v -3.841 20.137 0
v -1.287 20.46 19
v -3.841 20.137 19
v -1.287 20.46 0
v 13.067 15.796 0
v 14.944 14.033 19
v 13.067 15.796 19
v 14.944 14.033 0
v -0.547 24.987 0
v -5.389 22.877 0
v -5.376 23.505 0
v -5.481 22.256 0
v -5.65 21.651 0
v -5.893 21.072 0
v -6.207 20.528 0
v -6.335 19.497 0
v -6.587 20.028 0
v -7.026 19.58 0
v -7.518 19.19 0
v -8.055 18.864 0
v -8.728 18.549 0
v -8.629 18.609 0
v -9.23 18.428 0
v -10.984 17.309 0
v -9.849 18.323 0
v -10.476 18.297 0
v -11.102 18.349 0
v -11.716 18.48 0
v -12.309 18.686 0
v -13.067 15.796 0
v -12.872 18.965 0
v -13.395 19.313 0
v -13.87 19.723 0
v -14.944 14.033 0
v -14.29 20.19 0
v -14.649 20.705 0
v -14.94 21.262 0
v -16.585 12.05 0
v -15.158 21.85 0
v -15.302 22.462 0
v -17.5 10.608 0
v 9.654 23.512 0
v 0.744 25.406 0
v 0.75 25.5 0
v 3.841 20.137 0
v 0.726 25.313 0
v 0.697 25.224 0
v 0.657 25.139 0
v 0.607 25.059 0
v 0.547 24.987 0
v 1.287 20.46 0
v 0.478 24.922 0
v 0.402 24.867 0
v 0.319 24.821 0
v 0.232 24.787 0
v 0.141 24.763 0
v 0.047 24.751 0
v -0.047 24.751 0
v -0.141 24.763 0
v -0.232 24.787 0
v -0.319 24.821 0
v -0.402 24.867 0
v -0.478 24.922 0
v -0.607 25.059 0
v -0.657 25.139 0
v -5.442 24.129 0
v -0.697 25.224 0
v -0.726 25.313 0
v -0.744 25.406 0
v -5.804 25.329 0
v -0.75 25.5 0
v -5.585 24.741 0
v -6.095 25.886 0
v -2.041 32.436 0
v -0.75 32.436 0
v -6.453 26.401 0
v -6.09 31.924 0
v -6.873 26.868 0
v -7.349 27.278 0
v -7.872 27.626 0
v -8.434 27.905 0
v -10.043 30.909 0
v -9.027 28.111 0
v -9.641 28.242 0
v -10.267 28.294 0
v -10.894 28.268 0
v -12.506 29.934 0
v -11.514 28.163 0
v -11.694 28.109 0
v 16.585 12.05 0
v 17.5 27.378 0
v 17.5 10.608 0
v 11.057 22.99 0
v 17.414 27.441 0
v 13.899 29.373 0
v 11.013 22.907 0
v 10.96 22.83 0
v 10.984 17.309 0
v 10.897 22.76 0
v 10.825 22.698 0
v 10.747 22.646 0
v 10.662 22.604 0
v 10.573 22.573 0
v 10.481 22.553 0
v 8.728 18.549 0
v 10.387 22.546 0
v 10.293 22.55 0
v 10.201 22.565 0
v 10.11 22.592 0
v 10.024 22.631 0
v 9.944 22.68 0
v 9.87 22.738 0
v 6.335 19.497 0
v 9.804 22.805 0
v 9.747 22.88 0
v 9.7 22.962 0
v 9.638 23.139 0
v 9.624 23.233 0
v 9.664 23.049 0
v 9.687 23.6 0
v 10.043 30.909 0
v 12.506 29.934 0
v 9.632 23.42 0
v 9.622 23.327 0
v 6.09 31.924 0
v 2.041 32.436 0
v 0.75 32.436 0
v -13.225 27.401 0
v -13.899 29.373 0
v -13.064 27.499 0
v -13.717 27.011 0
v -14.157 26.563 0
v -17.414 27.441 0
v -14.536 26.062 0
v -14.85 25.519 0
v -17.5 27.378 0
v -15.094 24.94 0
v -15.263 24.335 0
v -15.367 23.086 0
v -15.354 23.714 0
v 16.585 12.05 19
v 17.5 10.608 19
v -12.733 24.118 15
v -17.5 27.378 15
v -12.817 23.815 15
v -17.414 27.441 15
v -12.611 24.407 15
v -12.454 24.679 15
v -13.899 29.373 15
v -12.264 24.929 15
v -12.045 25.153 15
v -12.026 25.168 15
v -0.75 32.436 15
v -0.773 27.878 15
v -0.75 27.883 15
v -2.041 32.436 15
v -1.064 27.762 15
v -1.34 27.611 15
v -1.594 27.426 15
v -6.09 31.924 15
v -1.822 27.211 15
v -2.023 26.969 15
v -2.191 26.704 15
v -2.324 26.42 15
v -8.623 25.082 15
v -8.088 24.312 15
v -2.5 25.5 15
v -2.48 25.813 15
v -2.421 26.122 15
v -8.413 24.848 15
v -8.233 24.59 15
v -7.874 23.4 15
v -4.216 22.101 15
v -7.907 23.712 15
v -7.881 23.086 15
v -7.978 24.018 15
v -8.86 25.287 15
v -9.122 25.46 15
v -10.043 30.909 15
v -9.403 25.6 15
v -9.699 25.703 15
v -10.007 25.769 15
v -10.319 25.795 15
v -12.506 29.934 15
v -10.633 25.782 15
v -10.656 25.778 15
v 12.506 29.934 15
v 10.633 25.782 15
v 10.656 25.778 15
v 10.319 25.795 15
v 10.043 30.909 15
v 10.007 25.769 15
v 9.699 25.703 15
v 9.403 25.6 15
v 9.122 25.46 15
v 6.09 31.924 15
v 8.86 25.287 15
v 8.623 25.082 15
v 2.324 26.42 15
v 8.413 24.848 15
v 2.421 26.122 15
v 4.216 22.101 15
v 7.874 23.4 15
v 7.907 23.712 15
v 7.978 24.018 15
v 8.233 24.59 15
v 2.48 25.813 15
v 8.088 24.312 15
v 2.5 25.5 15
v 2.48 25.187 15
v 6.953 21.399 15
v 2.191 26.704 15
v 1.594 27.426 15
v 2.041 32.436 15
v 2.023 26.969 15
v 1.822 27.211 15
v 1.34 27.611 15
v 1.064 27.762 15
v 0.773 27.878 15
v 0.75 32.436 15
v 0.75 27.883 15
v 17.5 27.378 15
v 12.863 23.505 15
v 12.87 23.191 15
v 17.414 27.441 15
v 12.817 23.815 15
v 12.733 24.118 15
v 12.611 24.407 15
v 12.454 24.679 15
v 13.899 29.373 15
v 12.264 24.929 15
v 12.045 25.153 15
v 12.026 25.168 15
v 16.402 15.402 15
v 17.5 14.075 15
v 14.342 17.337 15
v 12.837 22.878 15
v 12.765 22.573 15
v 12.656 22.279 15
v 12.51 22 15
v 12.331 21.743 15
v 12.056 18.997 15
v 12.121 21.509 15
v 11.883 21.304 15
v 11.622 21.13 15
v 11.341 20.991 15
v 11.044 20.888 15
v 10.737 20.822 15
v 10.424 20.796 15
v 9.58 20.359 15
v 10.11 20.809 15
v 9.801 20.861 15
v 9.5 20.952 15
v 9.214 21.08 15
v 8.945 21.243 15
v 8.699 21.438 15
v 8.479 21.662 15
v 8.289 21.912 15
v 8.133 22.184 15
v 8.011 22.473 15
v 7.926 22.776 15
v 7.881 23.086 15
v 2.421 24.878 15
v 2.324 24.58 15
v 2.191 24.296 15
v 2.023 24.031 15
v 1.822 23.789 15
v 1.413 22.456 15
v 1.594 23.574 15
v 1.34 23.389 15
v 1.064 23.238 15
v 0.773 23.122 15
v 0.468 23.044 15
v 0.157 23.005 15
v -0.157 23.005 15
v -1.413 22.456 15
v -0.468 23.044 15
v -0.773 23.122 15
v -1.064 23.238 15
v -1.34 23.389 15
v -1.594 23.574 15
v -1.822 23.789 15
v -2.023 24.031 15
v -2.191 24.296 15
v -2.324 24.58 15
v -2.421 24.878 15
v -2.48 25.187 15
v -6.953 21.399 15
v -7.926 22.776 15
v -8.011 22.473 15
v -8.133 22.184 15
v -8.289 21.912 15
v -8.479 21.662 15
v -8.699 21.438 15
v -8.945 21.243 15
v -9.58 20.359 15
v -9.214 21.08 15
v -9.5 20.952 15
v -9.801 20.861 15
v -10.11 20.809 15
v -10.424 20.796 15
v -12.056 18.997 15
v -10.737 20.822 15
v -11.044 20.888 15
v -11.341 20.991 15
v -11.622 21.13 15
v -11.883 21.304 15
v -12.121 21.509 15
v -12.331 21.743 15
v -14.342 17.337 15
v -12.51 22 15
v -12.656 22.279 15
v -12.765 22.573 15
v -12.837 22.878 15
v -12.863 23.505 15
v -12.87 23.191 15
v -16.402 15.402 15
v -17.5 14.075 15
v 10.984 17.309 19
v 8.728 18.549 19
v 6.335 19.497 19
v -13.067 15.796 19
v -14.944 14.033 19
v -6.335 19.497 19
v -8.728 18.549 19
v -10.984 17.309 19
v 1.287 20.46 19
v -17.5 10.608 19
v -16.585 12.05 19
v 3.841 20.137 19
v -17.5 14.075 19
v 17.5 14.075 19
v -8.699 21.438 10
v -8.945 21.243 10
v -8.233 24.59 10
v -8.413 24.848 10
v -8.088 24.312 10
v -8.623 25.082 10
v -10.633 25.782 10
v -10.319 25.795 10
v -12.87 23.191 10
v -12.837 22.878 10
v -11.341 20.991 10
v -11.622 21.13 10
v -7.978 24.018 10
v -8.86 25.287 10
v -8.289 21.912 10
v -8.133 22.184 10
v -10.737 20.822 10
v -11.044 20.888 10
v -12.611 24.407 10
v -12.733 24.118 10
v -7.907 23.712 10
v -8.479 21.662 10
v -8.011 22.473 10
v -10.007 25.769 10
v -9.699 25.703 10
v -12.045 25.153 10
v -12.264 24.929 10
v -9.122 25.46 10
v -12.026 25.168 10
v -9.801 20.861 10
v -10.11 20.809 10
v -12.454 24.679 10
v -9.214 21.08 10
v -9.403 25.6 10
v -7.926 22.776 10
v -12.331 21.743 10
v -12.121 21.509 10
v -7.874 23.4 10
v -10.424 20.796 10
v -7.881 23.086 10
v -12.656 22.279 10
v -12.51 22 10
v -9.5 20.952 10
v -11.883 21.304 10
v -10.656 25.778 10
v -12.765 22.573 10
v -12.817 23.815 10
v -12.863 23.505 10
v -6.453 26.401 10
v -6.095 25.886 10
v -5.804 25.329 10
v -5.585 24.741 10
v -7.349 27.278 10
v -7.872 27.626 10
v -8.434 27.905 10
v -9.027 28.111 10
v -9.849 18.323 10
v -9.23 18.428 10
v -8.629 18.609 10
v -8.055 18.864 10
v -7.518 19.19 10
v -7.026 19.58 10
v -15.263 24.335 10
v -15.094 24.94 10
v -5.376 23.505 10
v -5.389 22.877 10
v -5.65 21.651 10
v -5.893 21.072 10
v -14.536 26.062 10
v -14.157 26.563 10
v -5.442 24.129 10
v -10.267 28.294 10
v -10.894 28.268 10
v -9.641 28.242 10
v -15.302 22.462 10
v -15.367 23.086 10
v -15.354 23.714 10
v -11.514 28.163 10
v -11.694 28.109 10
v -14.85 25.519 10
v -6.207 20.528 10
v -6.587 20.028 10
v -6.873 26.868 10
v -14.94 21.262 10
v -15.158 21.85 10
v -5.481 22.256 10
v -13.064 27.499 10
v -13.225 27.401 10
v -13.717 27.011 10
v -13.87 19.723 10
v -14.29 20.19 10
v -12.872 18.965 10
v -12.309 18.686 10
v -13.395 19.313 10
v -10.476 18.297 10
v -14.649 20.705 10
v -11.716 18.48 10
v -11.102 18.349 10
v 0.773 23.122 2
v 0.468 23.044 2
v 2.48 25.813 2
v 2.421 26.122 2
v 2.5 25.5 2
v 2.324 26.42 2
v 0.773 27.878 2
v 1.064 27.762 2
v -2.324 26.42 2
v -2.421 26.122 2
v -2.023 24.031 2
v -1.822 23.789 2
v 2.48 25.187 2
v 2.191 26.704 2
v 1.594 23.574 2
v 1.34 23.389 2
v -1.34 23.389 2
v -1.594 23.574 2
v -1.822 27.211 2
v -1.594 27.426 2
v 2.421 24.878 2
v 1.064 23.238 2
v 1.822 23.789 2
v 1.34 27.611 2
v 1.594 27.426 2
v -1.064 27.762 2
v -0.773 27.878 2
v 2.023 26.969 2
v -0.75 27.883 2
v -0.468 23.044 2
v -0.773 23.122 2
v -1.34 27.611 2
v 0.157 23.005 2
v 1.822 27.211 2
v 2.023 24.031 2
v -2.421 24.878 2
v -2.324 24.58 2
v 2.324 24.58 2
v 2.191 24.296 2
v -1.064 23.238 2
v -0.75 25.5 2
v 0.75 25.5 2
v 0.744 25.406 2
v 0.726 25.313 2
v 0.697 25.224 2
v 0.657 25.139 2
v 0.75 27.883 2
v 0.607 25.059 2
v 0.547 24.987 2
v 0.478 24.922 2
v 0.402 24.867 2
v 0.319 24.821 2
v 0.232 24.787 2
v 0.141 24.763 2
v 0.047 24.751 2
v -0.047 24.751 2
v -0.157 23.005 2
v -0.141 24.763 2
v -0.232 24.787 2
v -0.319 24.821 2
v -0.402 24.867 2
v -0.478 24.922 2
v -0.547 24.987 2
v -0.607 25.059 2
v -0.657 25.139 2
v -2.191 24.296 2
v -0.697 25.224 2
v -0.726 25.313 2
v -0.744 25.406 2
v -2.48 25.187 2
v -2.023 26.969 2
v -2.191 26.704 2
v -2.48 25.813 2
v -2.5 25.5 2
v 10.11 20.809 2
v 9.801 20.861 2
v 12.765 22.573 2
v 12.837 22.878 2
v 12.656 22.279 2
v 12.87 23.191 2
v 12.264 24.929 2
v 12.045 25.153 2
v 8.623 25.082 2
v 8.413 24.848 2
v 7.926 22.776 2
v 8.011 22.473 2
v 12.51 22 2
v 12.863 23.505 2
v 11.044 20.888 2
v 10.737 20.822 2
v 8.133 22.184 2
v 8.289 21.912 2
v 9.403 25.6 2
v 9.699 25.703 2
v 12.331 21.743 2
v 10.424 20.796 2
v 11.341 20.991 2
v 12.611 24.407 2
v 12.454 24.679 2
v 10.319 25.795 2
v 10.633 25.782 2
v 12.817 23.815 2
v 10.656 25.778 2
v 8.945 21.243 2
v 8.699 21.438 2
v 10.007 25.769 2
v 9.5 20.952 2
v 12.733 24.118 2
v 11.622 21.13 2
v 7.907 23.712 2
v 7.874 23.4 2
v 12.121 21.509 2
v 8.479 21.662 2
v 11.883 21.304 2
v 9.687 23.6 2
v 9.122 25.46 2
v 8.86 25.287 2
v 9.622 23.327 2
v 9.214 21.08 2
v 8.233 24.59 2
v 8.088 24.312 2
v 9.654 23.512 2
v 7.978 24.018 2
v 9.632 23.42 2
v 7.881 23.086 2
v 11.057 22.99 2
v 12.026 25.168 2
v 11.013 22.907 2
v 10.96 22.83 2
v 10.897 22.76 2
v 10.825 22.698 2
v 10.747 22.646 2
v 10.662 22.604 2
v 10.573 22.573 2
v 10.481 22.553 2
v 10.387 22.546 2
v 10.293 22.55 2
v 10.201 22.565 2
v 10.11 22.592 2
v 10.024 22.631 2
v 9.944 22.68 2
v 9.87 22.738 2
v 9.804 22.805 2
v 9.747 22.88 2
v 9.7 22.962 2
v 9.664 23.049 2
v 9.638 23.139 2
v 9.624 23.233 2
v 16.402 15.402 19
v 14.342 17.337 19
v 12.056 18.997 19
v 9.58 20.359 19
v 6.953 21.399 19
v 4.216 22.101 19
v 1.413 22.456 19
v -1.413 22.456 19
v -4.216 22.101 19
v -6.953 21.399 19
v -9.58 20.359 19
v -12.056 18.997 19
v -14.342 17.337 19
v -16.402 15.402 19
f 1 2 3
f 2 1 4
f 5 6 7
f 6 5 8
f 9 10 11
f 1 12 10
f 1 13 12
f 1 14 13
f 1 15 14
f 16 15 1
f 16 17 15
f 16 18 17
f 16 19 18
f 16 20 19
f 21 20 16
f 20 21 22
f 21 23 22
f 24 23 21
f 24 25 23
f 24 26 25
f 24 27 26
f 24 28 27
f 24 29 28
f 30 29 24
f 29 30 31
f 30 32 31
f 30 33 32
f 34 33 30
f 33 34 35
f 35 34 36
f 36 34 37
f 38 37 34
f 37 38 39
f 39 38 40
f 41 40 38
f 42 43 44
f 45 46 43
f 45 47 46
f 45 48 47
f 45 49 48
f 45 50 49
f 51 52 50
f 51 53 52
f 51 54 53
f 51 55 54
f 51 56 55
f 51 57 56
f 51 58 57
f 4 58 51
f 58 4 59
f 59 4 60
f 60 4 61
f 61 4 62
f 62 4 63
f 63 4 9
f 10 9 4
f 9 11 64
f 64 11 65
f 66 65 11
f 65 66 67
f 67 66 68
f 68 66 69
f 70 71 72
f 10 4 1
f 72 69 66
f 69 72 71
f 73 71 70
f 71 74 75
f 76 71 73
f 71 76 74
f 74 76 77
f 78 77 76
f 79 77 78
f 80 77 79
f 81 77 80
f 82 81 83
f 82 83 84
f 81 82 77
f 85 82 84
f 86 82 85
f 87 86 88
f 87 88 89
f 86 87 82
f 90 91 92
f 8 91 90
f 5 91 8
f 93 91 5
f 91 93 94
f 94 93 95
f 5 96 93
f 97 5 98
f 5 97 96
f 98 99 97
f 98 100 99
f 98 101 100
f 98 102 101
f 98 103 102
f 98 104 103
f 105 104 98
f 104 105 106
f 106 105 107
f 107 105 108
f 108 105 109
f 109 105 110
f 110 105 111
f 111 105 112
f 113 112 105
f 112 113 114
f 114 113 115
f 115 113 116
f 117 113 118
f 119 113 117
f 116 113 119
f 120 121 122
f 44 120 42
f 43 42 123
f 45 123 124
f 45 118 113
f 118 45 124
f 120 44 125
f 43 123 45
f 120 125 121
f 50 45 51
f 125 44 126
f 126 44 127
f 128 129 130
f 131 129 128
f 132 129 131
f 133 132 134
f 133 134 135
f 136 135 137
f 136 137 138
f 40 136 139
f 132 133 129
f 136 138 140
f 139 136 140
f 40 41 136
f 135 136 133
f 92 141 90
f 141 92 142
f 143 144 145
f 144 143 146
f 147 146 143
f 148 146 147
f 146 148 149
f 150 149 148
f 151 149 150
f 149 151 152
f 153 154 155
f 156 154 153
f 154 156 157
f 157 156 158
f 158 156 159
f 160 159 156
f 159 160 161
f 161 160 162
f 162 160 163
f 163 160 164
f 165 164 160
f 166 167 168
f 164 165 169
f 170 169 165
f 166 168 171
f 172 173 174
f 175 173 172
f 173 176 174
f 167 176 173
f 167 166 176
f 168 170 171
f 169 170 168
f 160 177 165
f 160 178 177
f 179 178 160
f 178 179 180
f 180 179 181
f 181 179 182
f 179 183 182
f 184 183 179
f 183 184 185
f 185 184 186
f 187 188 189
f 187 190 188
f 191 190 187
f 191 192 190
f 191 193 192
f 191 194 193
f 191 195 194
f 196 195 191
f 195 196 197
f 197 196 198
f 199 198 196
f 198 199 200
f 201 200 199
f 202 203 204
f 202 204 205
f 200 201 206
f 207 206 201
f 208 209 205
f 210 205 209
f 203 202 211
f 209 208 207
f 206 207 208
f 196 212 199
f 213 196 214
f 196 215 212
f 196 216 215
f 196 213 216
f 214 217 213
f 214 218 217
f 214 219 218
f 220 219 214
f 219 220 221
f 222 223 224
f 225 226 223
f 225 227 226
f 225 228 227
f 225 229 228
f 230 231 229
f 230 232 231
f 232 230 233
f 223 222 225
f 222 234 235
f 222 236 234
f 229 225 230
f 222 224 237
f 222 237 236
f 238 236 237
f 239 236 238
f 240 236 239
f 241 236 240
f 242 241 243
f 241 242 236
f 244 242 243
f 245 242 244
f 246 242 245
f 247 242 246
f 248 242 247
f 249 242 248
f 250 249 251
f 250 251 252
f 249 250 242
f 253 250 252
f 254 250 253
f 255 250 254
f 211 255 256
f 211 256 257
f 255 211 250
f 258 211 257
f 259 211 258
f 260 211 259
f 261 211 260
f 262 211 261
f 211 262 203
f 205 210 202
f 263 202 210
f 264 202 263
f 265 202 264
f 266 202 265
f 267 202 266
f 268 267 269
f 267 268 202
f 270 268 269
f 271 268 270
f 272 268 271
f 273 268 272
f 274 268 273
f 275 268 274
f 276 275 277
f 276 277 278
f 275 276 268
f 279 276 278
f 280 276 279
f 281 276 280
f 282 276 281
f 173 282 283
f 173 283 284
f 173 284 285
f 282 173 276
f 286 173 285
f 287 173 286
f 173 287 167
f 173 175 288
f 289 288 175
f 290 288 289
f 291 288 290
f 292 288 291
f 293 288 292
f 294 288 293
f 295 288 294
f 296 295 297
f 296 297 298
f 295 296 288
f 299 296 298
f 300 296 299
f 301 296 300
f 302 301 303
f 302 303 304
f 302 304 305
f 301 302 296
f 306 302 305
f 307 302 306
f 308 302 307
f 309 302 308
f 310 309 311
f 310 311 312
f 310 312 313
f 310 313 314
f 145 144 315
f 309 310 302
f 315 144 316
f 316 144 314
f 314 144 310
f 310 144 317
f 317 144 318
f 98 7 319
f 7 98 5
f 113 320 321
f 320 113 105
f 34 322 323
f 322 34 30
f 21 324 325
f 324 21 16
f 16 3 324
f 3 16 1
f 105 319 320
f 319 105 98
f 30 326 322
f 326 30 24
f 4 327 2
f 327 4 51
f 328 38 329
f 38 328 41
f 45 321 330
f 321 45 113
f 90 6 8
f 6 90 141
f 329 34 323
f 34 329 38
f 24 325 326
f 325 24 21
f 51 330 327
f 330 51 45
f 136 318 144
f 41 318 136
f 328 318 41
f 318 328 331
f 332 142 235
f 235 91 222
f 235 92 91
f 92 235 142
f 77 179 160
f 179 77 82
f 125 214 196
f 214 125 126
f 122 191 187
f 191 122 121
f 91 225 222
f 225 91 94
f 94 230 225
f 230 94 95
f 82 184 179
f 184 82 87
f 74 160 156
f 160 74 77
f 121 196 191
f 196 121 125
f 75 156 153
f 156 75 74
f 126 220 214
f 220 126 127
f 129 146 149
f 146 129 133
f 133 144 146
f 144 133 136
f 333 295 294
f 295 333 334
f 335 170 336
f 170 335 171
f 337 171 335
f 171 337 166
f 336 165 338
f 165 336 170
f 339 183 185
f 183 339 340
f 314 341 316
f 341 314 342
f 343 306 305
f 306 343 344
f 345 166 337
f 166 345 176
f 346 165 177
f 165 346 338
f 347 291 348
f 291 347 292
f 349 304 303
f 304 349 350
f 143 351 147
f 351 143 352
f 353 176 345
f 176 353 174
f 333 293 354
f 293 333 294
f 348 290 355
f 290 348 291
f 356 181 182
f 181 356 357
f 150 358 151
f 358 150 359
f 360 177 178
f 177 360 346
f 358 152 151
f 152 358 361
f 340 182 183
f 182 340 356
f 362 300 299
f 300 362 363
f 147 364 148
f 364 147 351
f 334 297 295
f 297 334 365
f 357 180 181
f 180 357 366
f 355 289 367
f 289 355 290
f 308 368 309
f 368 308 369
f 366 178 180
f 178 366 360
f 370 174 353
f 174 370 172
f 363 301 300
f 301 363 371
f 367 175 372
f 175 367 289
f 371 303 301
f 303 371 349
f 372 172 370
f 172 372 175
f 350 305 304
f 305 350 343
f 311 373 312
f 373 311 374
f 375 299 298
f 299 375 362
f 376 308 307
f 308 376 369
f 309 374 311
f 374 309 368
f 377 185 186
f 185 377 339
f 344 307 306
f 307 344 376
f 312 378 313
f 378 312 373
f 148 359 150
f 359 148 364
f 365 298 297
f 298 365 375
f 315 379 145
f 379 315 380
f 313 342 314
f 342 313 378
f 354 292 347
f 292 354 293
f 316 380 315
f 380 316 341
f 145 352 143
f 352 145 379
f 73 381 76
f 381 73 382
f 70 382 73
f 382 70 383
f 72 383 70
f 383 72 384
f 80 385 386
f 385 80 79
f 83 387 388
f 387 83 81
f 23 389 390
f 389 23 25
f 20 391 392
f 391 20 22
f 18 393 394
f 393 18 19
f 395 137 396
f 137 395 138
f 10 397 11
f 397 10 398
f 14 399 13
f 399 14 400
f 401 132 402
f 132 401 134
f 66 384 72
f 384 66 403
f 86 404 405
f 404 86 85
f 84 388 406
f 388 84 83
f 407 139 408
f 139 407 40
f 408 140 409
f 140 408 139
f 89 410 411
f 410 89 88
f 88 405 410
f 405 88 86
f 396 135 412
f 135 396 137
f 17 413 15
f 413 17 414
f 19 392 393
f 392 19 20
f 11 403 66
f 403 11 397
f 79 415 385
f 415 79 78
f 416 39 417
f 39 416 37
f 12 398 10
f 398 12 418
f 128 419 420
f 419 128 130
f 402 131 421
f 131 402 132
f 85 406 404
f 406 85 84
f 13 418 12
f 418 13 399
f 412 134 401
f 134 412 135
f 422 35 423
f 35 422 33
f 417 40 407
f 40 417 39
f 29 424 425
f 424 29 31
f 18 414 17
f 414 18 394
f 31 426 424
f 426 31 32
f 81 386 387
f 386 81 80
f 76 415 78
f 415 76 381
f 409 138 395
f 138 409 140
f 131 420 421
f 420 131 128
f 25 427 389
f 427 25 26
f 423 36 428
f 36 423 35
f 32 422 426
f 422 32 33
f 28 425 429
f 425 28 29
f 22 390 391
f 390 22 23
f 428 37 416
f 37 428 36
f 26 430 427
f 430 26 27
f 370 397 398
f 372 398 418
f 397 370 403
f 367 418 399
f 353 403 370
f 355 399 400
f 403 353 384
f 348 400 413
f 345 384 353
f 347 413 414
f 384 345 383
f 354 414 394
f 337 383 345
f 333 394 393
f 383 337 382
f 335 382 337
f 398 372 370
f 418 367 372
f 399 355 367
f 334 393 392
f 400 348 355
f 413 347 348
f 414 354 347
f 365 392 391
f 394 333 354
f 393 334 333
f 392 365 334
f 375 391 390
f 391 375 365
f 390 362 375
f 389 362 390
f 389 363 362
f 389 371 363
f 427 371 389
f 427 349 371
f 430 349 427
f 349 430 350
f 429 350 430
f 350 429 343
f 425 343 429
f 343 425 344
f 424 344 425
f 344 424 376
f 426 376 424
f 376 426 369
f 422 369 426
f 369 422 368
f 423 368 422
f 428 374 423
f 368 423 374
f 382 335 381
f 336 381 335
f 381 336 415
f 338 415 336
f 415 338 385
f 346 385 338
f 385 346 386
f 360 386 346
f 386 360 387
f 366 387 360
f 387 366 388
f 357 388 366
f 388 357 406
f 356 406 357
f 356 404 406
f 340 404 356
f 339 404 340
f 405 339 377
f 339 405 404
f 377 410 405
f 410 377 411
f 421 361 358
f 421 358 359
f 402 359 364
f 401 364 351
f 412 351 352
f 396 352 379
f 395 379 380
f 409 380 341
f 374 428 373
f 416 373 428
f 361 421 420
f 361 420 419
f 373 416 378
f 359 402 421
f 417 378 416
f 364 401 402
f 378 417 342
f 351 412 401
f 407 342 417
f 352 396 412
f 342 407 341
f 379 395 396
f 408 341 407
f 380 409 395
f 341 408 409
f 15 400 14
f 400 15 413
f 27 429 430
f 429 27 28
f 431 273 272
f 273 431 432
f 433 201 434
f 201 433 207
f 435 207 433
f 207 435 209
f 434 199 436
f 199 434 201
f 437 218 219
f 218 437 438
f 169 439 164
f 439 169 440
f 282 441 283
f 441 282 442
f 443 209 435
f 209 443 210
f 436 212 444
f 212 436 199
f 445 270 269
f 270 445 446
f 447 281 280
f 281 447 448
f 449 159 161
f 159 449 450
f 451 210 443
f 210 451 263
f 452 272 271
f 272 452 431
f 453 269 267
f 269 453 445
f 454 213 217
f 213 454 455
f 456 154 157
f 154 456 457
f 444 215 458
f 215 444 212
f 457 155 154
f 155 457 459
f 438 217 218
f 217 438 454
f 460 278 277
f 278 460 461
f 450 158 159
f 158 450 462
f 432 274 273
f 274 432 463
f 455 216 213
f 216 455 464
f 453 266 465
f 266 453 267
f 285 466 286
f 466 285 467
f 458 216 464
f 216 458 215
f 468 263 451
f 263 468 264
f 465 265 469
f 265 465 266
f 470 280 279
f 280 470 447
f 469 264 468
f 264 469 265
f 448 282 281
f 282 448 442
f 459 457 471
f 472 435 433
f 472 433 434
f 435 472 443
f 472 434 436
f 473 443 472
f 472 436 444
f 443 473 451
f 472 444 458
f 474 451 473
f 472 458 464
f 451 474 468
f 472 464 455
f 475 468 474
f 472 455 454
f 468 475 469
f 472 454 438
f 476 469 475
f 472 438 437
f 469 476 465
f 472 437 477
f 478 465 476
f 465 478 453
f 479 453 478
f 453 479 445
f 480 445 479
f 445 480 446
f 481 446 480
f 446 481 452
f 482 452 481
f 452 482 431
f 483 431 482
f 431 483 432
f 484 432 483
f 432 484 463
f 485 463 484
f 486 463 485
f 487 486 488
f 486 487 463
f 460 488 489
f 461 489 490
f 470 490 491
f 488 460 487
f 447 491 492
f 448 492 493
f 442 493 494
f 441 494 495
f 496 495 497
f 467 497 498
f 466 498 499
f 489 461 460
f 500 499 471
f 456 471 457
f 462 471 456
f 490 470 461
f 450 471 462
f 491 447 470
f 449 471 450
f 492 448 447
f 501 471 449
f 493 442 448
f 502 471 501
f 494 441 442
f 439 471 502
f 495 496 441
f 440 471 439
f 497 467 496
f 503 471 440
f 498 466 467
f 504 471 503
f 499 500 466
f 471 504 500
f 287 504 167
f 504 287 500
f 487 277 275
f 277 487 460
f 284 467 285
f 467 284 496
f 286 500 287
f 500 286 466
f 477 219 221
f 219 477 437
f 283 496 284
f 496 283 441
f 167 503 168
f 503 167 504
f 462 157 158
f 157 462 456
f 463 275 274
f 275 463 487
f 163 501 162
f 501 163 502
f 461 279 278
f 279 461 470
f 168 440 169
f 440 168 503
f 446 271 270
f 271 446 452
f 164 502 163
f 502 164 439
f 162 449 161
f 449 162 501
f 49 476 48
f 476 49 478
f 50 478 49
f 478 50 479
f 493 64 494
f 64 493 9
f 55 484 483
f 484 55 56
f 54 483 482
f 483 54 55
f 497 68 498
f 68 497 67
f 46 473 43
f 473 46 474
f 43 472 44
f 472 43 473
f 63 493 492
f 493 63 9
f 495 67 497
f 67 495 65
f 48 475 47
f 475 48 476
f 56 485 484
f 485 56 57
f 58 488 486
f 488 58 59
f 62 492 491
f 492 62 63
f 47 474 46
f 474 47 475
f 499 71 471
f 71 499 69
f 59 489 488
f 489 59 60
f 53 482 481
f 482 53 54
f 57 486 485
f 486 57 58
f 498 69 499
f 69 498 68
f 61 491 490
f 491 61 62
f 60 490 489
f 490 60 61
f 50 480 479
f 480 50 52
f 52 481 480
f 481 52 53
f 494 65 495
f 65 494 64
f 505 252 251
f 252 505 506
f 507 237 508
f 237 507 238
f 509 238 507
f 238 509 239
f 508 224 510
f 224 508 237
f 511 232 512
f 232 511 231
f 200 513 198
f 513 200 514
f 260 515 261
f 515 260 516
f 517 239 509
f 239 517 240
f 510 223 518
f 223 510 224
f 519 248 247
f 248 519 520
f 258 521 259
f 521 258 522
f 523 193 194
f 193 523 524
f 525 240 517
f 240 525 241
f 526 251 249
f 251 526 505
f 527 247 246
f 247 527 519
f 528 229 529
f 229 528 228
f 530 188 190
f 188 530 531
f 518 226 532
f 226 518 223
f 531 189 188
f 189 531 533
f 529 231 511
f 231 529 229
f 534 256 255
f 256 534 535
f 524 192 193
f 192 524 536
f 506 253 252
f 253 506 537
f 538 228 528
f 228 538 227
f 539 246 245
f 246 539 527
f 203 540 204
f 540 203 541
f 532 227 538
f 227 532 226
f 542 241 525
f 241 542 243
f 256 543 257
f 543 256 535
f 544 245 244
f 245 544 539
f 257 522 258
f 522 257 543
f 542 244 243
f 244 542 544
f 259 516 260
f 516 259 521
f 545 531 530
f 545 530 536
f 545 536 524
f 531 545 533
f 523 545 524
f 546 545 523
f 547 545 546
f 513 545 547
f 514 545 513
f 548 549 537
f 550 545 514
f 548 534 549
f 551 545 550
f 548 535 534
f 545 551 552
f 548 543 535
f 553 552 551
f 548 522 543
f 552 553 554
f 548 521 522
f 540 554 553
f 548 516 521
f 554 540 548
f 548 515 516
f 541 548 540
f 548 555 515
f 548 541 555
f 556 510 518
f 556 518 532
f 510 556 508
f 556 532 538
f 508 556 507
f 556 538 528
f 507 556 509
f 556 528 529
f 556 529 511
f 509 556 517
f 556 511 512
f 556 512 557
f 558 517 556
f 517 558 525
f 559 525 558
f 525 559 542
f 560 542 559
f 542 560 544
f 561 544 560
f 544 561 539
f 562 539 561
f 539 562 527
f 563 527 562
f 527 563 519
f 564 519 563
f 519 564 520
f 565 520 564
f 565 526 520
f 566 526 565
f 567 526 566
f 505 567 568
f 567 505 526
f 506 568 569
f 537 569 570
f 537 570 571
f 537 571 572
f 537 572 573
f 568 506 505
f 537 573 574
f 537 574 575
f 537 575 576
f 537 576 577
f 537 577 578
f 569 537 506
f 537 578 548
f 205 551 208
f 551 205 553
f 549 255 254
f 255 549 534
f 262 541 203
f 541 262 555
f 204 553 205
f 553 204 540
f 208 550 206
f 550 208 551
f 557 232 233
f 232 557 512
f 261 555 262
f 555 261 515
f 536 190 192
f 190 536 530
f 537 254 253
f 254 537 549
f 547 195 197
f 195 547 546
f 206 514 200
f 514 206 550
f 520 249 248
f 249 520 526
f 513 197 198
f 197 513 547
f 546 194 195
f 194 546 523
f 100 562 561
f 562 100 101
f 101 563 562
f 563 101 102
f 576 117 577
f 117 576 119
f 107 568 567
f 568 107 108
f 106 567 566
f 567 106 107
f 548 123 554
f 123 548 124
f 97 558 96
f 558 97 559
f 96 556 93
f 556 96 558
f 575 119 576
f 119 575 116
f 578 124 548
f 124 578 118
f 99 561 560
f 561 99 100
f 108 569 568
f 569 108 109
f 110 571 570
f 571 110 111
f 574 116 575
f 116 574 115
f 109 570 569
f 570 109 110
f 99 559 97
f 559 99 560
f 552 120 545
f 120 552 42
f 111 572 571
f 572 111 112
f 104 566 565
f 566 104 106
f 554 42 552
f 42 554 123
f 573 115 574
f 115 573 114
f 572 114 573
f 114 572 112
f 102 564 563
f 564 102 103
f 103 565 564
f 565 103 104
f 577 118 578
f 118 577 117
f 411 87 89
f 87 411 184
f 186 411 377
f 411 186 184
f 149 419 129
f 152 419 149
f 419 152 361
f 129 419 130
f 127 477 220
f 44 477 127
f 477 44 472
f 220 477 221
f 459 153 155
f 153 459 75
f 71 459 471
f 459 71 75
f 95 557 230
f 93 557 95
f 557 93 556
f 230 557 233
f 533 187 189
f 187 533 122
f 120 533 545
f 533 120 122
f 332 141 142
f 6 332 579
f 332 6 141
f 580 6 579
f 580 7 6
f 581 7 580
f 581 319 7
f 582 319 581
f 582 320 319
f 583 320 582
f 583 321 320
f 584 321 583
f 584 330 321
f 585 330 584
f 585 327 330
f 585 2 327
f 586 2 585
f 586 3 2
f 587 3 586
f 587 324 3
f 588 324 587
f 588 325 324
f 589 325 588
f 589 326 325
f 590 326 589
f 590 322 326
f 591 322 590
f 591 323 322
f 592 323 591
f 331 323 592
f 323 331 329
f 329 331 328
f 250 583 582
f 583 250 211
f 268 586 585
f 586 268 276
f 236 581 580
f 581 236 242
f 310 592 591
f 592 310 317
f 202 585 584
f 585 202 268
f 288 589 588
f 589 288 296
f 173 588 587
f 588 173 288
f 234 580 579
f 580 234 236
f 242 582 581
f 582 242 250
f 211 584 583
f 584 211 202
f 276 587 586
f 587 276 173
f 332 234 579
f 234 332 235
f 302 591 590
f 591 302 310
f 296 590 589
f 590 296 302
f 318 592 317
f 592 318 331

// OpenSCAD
//tube diameters
D1=41; // original


//small hole diameters
d1=5; // hose
d2=6; 
d3=10; //existing clamp
$fn=50;


module shape_1(d_inner, d_outer, z){
    
    //D2 = D1 + 2* d3 + 4; //outer tube (for topmost bound)
    //Z = 15;
    SIDE_OFFS = 3;
    
    difference() {
        //color("red")
        cylinder(d=d_outer, h=z);

        union() {
            //tube diameter
            color("blue")
            cylinder(d=d_inner, h=z);
            
            //bottom bound 
            translate([-(d_outer/2), -(d_outer/2),0])
            cube([d_outer, d_outer/2, z]);

            //left bound
            translate([-(d_inner/2)-20 + SIDE_OFFS,0,0])
                cube([20, d_outer, z]);

            //right bound
            translate([d_inner/2 - SIDE_OFFS,0,0])
                cube([20, d_outer, z]);
            
        }
    }
}

module cutout(z){
    zz = 10; //existing hole
    CUTOUT = 1.5;
    
    //left
    rotate([0,0,24])
    translate([0,(D1+d3)/2,0]) {        
        translate([0,0,2]) {
            cylinder(d=d1, h=z);                        
        }
        cylinder(d=d3, h=zz);
        cylinder(d=CUTOUT, h=z);
    }
    
    rotate([0,0,24])
    translate([-CUTOUT/2,(D1+d3)/2,0]) 
    cube([CUTOUT,d3,z]);

    
    //middle
    translate([0,(D1+d3)/2,0]){
        translate([0,0,2]) {
            cylinder(d=d1, h=z);
        }
        cylinder(d=CUTOUT, h=z);
    }
        
    translate([-CUTOUT/2,(D1+d3)/2,0]) 
    cube([CUTOUT,d3,z]);
    
    //right

    rotate([0,0,-24])
    translate([0,(D1+d3)/2,0]){
        translate([0,0,2]) {
            cylinder(d=d1, h=z);
        }
        cylinder(d=CUTOUT, h=z);
    }

    rotate([0,0,-24])
    translate([-CUTOUT/2,(D1+d3)/2,0]) 
    cube([CUTOUT,d3,z]);

}

module clamp() {
    DX = D1 + 3;
    
}

Z = 15;

difference(){
    shape_1(D1, D1 + 2* d3 + 4, Z);
    cutout(Z);
}

translate([0,0,Z])
shape_1(D1, D1 + 4, 4);

//color("red")
//cylinder(d=D1, h=15);
